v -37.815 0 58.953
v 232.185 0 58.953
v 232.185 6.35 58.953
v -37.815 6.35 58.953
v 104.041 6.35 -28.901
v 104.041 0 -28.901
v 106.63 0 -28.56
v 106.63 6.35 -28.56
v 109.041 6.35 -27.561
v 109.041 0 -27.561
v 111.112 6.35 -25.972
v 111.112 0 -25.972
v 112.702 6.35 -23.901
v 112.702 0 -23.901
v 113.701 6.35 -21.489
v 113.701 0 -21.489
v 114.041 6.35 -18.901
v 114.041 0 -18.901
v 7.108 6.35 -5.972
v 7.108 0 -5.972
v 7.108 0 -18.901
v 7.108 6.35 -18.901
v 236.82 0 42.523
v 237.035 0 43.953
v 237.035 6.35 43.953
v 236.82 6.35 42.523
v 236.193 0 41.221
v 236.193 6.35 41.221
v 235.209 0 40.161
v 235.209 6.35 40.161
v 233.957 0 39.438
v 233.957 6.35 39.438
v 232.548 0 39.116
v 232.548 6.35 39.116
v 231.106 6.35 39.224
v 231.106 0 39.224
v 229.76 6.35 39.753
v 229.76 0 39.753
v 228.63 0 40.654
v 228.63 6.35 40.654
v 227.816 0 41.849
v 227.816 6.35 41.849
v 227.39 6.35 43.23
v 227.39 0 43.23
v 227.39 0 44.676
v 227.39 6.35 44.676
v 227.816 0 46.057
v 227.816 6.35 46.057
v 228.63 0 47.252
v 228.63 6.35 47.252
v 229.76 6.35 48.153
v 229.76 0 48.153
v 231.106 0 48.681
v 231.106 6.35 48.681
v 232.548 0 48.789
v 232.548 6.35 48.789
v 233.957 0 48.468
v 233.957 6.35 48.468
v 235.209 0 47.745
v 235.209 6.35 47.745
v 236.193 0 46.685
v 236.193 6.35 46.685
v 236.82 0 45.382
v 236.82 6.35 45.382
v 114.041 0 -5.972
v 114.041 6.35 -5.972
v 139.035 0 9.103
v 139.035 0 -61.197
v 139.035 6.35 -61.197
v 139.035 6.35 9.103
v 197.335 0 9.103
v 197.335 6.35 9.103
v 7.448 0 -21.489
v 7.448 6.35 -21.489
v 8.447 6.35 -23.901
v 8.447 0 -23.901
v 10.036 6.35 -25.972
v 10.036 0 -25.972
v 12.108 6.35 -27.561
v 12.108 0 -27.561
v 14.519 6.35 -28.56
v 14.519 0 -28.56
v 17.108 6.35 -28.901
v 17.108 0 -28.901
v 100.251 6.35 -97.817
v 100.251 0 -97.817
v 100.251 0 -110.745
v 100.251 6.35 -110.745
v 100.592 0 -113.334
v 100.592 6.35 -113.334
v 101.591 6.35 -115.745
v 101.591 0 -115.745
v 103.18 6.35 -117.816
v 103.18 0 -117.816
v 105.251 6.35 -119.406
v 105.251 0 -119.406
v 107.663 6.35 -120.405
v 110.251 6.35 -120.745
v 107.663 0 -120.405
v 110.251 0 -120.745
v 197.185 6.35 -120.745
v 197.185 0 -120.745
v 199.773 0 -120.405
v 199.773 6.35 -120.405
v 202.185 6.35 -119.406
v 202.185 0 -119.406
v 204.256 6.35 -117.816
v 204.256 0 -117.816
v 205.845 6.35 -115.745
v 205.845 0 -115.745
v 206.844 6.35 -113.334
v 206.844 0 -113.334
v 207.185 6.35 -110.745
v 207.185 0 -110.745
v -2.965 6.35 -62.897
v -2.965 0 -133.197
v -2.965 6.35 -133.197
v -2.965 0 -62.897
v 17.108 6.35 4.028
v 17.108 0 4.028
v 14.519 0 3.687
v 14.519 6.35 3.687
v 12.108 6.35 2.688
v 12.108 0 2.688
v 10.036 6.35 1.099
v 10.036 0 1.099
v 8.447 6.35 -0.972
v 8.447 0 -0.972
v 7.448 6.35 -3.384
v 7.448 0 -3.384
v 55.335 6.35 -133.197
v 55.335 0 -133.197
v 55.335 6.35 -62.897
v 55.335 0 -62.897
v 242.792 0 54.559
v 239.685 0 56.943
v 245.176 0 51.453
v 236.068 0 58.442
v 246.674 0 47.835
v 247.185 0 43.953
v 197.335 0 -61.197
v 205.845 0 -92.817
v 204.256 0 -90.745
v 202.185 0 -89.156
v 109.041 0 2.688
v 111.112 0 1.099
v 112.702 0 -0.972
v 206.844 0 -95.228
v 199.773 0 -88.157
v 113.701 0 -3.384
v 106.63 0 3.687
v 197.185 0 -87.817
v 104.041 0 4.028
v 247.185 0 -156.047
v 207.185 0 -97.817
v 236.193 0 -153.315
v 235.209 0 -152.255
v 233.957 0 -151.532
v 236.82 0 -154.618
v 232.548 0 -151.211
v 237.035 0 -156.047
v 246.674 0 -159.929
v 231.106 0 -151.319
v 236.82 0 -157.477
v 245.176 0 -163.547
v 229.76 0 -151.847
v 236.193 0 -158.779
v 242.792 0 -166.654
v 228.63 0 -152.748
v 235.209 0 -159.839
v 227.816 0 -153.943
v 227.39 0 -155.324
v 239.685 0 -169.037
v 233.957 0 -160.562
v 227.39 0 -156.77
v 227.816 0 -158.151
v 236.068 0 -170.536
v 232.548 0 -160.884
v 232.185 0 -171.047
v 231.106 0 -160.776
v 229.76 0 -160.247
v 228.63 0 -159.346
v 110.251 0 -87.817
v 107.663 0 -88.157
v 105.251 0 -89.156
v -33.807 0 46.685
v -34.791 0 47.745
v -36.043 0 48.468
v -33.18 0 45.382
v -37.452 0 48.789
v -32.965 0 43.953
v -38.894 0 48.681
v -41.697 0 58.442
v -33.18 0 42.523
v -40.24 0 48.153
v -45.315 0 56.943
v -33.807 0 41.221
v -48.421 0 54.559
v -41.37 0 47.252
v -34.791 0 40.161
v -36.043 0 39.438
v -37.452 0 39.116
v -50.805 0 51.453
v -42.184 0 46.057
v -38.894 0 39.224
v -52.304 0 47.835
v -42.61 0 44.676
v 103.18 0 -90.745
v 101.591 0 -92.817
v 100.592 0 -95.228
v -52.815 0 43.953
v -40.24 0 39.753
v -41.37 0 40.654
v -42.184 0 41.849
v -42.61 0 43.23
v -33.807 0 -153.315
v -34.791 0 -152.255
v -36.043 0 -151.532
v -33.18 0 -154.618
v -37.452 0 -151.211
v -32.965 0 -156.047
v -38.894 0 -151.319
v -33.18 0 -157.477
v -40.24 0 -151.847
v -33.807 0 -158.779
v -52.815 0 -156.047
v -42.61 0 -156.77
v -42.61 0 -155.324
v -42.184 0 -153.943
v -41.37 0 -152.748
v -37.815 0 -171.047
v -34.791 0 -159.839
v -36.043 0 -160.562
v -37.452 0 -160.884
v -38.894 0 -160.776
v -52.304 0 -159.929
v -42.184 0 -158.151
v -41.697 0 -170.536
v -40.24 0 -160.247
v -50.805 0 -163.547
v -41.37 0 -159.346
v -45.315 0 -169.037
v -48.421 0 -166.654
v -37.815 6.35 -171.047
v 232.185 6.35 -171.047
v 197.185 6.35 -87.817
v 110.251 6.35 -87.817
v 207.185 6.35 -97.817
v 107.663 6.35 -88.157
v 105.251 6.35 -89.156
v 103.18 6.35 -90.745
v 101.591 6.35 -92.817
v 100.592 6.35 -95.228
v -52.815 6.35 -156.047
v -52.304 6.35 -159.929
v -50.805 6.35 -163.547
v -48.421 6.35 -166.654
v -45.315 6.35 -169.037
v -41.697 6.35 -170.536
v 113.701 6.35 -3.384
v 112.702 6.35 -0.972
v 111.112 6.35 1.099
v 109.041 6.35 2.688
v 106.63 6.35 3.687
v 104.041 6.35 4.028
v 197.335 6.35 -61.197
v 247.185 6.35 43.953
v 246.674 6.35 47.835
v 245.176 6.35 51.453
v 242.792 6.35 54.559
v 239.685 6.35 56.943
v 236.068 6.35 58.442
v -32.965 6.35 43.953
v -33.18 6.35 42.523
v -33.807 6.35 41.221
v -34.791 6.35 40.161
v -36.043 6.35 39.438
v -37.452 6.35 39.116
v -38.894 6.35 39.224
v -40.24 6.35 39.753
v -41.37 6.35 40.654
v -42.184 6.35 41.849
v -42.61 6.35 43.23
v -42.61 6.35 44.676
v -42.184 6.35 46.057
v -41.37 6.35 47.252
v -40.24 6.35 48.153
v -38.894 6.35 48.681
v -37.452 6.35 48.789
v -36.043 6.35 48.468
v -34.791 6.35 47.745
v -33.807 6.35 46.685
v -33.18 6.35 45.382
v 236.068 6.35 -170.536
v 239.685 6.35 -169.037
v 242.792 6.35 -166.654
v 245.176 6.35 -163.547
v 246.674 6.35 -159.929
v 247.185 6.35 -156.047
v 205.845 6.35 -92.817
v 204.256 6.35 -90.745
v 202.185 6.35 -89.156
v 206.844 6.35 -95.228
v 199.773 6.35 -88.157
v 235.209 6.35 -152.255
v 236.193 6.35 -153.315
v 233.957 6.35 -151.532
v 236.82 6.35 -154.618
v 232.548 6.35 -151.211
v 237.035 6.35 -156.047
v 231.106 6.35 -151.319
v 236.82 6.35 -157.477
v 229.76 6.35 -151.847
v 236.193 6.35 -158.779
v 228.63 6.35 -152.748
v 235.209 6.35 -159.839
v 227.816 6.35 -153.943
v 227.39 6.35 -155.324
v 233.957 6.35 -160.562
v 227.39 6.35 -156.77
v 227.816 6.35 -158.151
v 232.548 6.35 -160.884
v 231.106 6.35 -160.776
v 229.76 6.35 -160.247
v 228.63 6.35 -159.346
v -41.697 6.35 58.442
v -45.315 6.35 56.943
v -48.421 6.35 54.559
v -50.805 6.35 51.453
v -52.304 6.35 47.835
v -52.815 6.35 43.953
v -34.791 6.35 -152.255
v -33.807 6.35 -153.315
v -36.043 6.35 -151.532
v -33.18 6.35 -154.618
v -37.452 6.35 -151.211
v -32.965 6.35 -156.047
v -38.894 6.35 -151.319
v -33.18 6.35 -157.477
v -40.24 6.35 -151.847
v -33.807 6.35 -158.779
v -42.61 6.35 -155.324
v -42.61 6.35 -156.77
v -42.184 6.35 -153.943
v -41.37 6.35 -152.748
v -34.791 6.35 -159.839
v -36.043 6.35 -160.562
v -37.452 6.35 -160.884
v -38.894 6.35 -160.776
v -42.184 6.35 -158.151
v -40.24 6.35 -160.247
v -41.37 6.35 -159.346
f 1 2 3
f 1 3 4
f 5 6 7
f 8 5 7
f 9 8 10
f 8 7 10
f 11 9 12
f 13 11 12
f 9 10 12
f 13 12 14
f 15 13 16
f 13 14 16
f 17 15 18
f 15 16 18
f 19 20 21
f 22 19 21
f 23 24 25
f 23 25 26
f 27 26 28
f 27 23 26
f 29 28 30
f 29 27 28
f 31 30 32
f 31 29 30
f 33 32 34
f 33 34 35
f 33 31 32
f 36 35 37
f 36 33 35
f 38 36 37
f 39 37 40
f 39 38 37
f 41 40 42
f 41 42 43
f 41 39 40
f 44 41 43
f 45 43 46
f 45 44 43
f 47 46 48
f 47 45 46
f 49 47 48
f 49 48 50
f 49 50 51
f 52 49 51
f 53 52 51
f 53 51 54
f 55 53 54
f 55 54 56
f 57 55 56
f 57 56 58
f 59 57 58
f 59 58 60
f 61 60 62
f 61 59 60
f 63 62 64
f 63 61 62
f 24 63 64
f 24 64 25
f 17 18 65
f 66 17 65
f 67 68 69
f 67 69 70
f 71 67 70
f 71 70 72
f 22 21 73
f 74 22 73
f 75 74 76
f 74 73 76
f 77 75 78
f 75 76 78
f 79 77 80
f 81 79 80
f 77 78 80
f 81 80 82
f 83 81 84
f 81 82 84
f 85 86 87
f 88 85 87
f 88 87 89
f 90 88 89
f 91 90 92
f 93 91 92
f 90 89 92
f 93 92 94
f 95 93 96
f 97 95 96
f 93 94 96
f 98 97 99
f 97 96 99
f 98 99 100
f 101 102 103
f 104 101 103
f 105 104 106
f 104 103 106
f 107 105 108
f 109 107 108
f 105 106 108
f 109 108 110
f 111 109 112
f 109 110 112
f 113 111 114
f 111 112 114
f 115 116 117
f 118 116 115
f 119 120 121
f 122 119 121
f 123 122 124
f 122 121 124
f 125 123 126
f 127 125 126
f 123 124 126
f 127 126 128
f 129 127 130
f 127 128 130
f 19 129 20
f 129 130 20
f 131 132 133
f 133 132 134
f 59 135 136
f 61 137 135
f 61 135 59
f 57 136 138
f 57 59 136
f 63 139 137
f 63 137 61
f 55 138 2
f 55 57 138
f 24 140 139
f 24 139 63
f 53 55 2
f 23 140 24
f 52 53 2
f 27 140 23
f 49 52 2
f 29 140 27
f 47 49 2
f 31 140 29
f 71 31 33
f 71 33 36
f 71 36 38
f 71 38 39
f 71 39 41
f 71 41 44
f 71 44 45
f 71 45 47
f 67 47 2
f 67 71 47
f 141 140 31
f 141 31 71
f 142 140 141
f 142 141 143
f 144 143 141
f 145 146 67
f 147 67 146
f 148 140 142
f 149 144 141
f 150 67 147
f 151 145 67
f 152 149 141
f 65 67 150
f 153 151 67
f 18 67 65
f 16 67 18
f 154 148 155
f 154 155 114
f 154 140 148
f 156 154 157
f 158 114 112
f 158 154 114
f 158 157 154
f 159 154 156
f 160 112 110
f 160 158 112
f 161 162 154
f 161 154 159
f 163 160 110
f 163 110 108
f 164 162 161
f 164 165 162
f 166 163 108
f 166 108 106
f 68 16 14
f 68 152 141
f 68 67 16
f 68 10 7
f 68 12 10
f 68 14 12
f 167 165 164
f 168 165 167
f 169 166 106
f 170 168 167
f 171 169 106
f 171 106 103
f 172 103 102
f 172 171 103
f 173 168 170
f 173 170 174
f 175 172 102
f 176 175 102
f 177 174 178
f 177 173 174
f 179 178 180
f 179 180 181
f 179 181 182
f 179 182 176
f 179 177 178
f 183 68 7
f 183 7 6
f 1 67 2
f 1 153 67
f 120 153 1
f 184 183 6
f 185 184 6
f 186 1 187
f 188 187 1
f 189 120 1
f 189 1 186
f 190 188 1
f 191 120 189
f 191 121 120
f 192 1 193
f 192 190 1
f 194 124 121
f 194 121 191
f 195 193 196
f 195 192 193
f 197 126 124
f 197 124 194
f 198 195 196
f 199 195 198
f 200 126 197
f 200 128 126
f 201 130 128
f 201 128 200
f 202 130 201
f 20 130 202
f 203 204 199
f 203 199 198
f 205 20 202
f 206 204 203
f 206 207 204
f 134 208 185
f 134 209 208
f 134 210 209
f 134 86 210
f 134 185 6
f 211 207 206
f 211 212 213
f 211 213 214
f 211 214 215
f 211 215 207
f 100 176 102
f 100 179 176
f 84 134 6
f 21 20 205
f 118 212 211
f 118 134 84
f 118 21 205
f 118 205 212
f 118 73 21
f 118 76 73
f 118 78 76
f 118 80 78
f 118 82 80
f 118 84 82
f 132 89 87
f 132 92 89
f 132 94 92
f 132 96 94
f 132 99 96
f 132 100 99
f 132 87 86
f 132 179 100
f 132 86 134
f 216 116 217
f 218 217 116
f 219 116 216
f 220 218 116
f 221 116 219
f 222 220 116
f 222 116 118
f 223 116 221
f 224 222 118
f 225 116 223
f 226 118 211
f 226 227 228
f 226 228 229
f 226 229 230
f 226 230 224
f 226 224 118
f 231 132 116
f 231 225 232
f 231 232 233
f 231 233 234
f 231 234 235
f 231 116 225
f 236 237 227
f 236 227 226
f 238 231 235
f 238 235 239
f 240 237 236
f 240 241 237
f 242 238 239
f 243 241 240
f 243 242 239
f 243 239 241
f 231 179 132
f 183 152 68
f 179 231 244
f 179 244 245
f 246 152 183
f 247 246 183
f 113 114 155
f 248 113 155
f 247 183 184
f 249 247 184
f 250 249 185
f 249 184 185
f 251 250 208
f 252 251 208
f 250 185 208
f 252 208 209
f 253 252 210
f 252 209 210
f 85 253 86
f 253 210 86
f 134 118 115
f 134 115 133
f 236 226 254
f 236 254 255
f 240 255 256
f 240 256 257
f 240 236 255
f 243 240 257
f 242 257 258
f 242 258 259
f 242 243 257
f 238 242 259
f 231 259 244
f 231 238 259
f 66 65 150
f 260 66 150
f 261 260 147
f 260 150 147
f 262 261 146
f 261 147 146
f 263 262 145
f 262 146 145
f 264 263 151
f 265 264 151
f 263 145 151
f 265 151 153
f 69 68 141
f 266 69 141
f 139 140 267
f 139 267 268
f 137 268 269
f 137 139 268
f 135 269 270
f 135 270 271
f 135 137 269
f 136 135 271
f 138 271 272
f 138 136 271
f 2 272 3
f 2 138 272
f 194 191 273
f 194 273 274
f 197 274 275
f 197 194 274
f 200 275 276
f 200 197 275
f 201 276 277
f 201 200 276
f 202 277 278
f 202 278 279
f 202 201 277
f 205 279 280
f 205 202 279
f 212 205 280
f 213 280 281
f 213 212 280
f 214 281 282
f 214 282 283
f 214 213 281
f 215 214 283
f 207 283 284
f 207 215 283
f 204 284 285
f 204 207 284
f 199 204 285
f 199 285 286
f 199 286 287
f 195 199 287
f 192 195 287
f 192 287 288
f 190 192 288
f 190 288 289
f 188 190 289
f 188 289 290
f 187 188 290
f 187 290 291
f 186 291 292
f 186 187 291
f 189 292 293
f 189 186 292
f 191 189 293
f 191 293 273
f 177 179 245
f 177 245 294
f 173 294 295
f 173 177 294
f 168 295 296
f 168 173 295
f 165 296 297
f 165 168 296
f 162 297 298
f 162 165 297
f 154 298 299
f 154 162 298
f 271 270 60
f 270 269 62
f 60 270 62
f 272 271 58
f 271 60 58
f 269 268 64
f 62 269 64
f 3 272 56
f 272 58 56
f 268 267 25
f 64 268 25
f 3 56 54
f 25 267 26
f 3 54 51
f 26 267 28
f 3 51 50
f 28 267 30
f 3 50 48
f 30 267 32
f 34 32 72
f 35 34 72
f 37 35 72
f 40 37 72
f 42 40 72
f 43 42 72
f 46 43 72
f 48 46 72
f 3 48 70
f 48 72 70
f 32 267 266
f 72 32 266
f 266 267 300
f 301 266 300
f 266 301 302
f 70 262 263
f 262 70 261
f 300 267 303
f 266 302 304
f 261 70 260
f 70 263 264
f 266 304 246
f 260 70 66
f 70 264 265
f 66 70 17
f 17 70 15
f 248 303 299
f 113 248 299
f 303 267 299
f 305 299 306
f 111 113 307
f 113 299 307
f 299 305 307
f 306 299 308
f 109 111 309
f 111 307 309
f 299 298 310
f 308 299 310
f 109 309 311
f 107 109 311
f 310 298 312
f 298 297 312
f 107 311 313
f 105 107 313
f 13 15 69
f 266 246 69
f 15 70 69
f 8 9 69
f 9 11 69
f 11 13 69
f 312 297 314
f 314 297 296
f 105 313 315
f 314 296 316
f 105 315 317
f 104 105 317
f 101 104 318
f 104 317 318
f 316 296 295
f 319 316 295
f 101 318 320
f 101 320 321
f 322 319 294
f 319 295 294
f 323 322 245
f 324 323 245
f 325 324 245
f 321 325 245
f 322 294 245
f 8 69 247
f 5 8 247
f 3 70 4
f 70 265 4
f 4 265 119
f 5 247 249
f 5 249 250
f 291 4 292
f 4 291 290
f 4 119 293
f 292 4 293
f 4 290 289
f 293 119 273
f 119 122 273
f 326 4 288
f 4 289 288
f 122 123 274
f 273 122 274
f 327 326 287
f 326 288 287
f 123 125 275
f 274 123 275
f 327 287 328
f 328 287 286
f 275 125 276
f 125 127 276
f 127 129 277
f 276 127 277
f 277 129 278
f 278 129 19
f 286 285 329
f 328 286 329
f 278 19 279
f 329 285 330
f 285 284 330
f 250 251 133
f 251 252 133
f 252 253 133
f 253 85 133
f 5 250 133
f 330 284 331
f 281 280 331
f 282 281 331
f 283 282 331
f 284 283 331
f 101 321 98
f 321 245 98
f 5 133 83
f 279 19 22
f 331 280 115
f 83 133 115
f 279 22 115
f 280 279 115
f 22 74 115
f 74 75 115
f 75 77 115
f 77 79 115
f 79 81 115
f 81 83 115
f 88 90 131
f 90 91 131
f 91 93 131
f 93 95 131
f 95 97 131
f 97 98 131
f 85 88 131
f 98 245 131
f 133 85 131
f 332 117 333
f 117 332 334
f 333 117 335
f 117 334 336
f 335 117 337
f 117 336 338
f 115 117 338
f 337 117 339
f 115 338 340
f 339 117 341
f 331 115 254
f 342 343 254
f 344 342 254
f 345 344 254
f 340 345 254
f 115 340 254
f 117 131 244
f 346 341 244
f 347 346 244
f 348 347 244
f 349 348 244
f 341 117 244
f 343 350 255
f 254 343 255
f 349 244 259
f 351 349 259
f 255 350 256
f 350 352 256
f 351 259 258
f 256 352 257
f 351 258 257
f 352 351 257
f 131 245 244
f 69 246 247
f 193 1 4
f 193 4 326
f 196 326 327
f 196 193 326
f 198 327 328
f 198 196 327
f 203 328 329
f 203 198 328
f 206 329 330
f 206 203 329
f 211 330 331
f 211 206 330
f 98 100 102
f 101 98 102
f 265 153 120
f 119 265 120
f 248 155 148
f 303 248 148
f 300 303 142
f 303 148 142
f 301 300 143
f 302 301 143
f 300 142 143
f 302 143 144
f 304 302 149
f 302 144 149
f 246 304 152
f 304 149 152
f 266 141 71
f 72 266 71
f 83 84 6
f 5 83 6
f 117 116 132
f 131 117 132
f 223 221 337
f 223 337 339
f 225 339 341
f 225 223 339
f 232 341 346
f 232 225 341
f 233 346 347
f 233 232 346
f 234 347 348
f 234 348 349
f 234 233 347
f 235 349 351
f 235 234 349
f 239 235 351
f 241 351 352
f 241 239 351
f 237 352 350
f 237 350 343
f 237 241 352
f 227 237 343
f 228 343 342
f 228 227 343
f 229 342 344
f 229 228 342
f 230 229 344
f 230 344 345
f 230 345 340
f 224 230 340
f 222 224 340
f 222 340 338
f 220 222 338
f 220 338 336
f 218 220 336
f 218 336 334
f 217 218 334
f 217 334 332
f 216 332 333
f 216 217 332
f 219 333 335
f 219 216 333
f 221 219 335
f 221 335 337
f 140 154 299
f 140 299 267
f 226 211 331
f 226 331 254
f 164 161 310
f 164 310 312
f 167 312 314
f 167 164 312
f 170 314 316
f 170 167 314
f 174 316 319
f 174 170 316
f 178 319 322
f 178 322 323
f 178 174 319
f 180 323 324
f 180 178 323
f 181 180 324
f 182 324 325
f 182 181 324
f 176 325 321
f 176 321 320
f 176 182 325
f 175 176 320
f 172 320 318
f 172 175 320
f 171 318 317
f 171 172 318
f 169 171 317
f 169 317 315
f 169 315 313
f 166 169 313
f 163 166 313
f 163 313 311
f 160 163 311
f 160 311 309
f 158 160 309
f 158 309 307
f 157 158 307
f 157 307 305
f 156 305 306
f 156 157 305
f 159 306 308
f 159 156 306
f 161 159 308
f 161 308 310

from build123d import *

# Parameters (mm, degrees)
SKETCH1_R           = 4.85
BOSS_EXTRUDE1_DEPTH = 6.35
SKETCH2_W           = 58.3
SKETCH2_H           = 70.3
CUT_EXTRUDE1_DEPTH  = 6.35
CUT_EXTRUDE2_DEPTH  = 6.35


with BuildPart() as part:
    # Sketch1 → Boss-Extrude1 (new body)
    with BuildSketch(Plane(origin=(0, 0, 0), x_dir=(1, 0, 0), z_dir=(0, 1, 0))):
        with BuildLine():
            Line((-37.814650179, 171.04710305), (232.185349821, 171.04710305))
            ThreePointArc((232.185349821, 171.04710305), (242.791951539, 166.653704768), (247.185349821, 156.04710305))
            Line((247.185349821, 156.04710305), (247.185349821, -43.95289695))
            ThreePointArc((247.185349821, -43.95289695), (242.791951539, -54.559498668), (232.185349821, -58.95289695))
            Line((232.185349821, -58.95289695), (-37.814650179, -58.95289695))
            ThreePointArc((-37.814650179, -58.95289695), (-48.421251896, -54.559498668), (-52.814650179, -43.95289695))
            Line((-52.814650179, -43.95289695), (-52.814650179, 156.04710305))
            ThreePointArc((-52.814650179, 156.04710305), (-48.421251896, 166.653704768), (-37.814650179, 171.04710305))
        make_face()
        with Locations((-37.814650179, 156.04710305)):
            Circle(SKETCH1_R, mode=Mode.SUBTRACT)
        with Locations((232.185349821, 156.04710305)):
            Circle(SKETCH1_R, mode=Mode.SUBTRACT)
        with Locations((232.185349821, -43.95289695)):
            Circle(SKETCH1_R, mode=Mode.SUBTRACT)
        with Locations((-37.814650179, -43.95289695)):
            Circle(SKETCH1_R, mode=Mode.SUBTRACT)
    extrude(amount=BOSS_EXTRUDE1_DEPTH)

    # Sketch2 → Cut-Extrude1 (cut)
    with BuildSketch(Plane.XZ):
        with Locations((168.185349821, -26.04710305)):
            Rectangle(SKETCH2_W, SKETCH2_H)
        with Locations((26.185349821, -98.04710305)):
            Rectangle(SKETCH2_W, SKETCH2_H)
    extrude(amount=-CUT_EXTRUDE1_DEPTH, mode=Mode.SUBTRACT)

    # Sketch3 → Cut-Extrude2 (cut)
    with BuildSketch(Plane.XZ):
        with BuildLine():
            Line((17.107545151, -28.900683481), (104.041408607, -28.900683481))
            ThreePointArc((104.041408607, -28.900683481), (111.112476419, -25.971751293), (114.041408607, -18.900683481))
            Line((114.041408607, -18.900683481), (114.041408607, -5.971842988))
            ThreePointArc((114.041408607, -5.971842988), (111.112476419, 1.099224823), (104.041408607, 4.028157012))
            Line((104.041408607, 4.028157012), (17.107545151, 4.028157012))
            ThreePointArc((17.107545151, 4.028157012), (10.03647734, 1.099224823), (7.107545151, -5.971842988))
            Line((7.107545151, -5.971842988), (7.107545151, -18.900683481))
            ThreePointArc((7.107545151, -18.900683481), (10.03647734, -25.971751293), (17.107545151, -28.900683481))
        make_face()
        with BuildLine():
            Line((110.251233871, -120.745362711), (197.185097326, -120.745362711))
            ThreePointArc((197.185097326, -120.745362711), (204.256165138, -117.816430523), (207.185097326, -110.745362711))
            Line((207.185097326, -110.745362711), (207.185097326, -97.816522218))
            ThreePointArc((207.185097326, -97.816522218), (204.256165138, -90.745454407), (197.185097326, -87.816522218))
            Line((197.185097326, -87.816522218), (110.251233871, -87.816522218))
            ThreePointArc((110.251233871, -87.816522218), (103.180166059, -90.745454407), (100.251233871, -97.816522218))
            Line((100.251233871, -97.816522218), (100.251233871, -110.745362711))
            ThreePointArc((100.251233871, -110.745362711), (103.180166059, -117.816430523), (110.251233871, -120.745362711))
        make_face()
    extrude(amount=-CUT_EXTRUDE2_DEPTH, mode=Mode.SUBTRACT)


solid = part.part
